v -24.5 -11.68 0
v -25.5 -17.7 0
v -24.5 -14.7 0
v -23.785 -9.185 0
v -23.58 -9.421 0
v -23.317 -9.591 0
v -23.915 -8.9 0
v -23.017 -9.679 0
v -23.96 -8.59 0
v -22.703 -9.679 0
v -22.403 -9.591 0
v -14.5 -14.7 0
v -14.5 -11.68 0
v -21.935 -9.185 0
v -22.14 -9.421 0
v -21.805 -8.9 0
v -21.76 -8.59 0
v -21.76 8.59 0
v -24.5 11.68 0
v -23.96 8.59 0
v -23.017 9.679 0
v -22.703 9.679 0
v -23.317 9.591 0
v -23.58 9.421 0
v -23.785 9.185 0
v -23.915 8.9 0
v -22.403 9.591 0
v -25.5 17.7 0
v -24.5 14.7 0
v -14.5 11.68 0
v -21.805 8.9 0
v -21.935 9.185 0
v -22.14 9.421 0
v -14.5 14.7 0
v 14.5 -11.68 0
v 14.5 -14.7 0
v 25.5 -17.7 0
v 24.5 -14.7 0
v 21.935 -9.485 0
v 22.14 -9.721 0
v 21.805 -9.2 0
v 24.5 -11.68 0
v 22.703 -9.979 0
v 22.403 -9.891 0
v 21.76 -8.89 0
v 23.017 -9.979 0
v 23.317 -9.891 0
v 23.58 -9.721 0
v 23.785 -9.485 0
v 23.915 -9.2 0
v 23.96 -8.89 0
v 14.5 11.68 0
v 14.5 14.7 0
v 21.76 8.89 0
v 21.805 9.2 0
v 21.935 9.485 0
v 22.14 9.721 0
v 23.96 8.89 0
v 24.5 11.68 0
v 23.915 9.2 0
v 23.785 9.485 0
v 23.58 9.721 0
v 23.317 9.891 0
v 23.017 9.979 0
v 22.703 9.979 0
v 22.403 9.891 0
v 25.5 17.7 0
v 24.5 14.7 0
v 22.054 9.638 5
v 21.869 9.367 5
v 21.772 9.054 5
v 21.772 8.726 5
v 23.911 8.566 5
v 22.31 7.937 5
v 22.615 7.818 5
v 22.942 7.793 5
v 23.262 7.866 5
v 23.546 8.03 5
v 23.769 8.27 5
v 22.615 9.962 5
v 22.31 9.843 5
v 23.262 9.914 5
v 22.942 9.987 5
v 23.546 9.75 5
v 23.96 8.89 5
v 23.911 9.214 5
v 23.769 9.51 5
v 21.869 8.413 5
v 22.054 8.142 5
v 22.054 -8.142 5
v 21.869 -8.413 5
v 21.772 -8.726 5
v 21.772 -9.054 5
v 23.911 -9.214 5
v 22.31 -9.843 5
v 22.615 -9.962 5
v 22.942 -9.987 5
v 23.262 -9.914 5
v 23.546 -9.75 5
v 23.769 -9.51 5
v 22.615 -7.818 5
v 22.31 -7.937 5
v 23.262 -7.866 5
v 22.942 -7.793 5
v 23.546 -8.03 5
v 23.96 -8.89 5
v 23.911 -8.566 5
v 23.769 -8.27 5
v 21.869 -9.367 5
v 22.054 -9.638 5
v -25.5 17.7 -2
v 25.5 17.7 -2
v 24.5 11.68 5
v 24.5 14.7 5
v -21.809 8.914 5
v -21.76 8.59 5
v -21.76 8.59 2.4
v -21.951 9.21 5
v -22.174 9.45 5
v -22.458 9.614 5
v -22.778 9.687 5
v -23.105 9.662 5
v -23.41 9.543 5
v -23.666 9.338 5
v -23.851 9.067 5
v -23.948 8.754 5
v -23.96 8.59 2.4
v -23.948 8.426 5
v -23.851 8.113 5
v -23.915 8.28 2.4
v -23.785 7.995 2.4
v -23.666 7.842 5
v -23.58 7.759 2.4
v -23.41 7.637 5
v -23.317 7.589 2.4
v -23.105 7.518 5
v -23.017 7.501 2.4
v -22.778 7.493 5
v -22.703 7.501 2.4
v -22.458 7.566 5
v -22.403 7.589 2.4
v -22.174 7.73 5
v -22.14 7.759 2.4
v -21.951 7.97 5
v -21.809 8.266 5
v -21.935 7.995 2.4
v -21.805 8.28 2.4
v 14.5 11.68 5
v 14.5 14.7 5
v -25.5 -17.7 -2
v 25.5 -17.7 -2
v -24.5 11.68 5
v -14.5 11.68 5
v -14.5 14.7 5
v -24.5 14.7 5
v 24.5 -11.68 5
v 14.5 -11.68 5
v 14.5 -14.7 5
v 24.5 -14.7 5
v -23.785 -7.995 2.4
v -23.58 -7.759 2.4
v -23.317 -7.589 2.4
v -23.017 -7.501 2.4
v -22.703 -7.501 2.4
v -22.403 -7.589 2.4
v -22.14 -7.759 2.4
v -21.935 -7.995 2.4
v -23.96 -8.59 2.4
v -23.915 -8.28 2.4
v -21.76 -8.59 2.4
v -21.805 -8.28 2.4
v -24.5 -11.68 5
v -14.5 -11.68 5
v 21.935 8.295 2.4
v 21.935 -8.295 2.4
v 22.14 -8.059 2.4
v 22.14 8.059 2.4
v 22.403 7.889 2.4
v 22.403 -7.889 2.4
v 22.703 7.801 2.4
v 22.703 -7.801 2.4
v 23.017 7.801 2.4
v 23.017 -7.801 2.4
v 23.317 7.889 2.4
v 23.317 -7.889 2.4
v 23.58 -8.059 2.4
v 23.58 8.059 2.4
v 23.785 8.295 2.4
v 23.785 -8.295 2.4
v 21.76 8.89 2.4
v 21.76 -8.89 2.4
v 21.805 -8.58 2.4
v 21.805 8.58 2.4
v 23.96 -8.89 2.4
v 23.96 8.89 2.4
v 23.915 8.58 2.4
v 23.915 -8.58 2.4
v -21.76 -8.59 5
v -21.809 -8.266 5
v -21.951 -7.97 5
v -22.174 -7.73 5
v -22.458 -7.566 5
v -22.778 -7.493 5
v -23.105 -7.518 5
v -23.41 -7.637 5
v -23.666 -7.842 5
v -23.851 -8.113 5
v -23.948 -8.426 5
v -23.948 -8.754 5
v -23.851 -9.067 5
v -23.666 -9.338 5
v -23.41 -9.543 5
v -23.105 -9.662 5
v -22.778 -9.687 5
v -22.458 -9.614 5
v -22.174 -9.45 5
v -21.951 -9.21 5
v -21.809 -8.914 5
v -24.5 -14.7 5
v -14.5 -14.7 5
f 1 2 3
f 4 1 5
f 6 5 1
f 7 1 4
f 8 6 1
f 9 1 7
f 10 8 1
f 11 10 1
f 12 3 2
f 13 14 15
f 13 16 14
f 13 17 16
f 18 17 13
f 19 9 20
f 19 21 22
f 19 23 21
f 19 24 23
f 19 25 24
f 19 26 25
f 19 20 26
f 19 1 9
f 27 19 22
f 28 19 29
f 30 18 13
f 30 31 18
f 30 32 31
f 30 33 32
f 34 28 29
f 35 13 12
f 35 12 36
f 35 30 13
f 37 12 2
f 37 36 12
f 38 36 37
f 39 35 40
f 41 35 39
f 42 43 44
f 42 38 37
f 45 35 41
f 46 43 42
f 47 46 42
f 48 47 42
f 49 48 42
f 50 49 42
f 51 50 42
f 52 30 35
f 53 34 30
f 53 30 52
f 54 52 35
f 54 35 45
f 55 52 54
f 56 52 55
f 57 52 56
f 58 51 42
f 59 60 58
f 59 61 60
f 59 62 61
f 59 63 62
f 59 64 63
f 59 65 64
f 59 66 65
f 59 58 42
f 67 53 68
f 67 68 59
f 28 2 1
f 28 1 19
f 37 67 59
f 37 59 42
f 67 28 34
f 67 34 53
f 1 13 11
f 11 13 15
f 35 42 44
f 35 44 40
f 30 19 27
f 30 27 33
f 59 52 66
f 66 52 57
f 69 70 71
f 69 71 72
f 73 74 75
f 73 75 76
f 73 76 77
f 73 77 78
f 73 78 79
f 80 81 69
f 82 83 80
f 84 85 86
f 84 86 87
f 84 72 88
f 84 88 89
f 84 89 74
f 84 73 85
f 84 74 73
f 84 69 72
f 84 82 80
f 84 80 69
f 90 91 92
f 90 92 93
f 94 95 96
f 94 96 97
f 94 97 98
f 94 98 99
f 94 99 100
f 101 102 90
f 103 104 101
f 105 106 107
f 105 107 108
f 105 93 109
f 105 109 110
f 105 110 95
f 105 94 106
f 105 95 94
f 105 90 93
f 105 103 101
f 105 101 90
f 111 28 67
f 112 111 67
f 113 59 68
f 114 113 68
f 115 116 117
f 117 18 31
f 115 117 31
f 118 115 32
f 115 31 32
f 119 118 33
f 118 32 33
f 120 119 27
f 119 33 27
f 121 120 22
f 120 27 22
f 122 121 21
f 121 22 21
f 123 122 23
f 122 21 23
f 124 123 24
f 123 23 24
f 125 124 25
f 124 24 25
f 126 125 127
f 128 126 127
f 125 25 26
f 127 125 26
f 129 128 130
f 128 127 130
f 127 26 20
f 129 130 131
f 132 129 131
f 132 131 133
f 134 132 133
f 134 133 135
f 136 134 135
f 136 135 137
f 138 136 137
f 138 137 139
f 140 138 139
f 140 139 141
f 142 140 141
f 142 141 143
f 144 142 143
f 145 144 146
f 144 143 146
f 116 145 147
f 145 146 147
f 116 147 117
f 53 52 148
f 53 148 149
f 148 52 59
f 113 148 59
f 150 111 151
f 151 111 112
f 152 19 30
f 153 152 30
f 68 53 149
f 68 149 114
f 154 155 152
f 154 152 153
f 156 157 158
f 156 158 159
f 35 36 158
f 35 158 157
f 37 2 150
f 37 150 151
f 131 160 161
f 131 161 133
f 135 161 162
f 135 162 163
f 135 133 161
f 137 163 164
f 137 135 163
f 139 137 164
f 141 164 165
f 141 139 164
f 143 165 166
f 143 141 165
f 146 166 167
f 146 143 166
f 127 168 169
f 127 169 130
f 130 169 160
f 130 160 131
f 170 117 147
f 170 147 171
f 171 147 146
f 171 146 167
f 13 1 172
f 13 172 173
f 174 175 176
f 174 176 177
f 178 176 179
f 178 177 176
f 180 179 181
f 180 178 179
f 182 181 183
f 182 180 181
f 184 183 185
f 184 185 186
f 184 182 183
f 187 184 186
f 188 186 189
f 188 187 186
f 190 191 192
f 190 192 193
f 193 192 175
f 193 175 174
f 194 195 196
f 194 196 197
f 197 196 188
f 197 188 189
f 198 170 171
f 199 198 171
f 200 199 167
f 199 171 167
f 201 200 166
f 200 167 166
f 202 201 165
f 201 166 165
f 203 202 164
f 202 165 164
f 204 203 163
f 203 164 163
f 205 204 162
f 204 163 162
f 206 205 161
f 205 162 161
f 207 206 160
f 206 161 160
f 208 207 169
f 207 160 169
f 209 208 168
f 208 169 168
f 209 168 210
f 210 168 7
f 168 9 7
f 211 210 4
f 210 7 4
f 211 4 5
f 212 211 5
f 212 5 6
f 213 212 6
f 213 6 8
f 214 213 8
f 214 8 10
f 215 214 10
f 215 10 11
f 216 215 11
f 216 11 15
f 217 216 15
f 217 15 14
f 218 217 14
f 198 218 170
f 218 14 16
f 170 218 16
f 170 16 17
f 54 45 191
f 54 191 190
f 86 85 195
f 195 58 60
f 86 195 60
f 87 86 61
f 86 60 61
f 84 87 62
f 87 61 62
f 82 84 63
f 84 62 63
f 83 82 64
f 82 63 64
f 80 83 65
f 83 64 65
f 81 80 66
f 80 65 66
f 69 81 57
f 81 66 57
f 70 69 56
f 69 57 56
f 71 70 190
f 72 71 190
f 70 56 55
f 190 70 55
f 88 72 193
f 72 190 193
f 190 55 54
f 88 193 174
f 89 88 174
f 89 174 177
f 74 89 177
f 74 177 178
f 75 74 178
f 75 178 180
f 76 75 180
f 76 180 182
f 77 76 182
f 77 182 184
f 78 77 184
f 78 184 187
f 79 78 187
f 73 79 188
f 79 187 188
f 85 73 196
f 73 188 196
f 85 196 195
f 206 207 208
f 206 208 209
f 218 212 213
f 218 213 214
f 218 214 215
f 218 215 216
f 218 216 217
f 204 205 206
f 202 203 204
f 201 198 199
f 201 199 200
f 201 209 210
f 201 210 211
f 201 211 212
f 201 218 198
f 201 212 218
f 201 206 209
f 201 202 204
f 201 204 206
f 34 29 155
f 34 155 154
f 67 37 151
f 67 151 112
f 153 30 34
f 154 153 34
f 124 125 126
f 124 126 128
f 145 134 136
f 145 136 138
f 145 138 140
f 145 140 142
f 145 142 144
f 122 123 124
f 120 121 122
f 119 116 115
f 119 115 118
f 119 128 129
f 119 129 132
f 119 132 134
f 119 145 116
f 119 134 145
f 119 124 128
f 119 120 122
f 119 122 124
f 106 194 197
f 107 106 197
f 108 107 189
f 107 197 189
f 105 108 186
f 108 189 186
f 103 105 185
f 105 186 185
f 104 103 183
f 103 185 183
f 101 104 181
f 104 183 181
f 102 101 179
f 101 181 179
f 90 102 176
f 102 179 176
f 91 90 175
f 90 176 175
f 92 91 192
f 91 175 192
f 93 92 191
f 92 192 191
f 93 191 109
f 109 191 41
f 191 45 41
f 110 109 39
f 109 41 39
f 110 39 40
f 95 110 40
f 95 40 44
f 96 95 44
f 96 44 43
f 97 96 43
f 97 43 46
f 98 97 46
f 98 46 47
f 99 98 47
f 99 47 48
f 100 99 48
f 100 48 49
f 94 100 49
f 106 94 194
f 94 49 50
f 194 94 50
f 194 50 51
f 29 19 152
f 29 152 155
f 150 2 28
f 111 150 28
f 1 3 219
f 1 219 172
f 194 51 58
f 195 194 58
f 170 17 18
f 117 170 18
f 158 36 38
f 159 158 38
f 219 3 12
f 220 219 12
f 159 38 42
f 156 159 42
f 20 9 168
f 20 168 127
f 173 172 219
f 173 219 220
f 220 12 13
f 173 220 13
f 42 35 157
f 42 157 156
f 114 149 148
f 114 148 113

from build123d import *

# Parameters (mm, degrees)
SKETCH030_W   = 51
SKETCH030_H   = 35.4
PAD011_DEPTH  = 2
SKETCH031_W   = 2.2
SKETCH031_H   = 17.18
SKETCH031_H_2 = 17.78
PAD012_DEPTH  = 2.4
SKETCH032_R   = 1.1
SKETCH032_W   = 10
SKETCH032_H   = 3.02
PAD013_DEPTH  = 5


with BuildPart() as part:
    # Sketch030 (on DatumPlane) → Pad011 (new body)
    with BuildSketch(Plane.XY):
        Rectangle(SKETCH030_W, SKETCH030_H)
    extrude(amount=-PAD011_DEPTH)

    # Sketch031 (on DatumPlane) → Pad012 (join)
    with BuildSketch(Plane.XY):
        with Locations((-22.86, 0)):
            Rectangle(SKETCH031_W, SKETCH031_H)
        with Locations((22.86, 0)):
            Rectangle(SKETCH031_W, SKETCH031_H_2)
    extrude(amount=PAD012_DEPTH)

    # Sketch032 (on DatumPlane) → Pad013 (join)
    with BuildSketch(Plane.XY):
        with Locations((-22.86, -8.59)):
            Circle(SKETCH032_R)
        with Locations((-22.86, 8.59)):
            Circle(SKETCH032_R)
        with Locations((22.86, 8.89)):
            Circle(SKETCH032_R)
        with Locations((22.86, -8.89)):
            Circle(SKETCH032_R)
        with Locations((-19.5, 13.19)):
            Rectangle(SKETCH032_W, SKETCH032_H)
        with Locations((19.5, 13.19)):
            Rectangle(SKETCH032_W, SKETCH032_H)
        with Locations((-19.5, -13.19)):
            Rectangle(SKETCH032_W, SKETCH032_H)
        with Locations((19.5, -13.19)):
            Rectangle(SKETCH032_W, SKETCH032_H)
    extrude(amount=PAD013_DEPTH)


solid = part.part
